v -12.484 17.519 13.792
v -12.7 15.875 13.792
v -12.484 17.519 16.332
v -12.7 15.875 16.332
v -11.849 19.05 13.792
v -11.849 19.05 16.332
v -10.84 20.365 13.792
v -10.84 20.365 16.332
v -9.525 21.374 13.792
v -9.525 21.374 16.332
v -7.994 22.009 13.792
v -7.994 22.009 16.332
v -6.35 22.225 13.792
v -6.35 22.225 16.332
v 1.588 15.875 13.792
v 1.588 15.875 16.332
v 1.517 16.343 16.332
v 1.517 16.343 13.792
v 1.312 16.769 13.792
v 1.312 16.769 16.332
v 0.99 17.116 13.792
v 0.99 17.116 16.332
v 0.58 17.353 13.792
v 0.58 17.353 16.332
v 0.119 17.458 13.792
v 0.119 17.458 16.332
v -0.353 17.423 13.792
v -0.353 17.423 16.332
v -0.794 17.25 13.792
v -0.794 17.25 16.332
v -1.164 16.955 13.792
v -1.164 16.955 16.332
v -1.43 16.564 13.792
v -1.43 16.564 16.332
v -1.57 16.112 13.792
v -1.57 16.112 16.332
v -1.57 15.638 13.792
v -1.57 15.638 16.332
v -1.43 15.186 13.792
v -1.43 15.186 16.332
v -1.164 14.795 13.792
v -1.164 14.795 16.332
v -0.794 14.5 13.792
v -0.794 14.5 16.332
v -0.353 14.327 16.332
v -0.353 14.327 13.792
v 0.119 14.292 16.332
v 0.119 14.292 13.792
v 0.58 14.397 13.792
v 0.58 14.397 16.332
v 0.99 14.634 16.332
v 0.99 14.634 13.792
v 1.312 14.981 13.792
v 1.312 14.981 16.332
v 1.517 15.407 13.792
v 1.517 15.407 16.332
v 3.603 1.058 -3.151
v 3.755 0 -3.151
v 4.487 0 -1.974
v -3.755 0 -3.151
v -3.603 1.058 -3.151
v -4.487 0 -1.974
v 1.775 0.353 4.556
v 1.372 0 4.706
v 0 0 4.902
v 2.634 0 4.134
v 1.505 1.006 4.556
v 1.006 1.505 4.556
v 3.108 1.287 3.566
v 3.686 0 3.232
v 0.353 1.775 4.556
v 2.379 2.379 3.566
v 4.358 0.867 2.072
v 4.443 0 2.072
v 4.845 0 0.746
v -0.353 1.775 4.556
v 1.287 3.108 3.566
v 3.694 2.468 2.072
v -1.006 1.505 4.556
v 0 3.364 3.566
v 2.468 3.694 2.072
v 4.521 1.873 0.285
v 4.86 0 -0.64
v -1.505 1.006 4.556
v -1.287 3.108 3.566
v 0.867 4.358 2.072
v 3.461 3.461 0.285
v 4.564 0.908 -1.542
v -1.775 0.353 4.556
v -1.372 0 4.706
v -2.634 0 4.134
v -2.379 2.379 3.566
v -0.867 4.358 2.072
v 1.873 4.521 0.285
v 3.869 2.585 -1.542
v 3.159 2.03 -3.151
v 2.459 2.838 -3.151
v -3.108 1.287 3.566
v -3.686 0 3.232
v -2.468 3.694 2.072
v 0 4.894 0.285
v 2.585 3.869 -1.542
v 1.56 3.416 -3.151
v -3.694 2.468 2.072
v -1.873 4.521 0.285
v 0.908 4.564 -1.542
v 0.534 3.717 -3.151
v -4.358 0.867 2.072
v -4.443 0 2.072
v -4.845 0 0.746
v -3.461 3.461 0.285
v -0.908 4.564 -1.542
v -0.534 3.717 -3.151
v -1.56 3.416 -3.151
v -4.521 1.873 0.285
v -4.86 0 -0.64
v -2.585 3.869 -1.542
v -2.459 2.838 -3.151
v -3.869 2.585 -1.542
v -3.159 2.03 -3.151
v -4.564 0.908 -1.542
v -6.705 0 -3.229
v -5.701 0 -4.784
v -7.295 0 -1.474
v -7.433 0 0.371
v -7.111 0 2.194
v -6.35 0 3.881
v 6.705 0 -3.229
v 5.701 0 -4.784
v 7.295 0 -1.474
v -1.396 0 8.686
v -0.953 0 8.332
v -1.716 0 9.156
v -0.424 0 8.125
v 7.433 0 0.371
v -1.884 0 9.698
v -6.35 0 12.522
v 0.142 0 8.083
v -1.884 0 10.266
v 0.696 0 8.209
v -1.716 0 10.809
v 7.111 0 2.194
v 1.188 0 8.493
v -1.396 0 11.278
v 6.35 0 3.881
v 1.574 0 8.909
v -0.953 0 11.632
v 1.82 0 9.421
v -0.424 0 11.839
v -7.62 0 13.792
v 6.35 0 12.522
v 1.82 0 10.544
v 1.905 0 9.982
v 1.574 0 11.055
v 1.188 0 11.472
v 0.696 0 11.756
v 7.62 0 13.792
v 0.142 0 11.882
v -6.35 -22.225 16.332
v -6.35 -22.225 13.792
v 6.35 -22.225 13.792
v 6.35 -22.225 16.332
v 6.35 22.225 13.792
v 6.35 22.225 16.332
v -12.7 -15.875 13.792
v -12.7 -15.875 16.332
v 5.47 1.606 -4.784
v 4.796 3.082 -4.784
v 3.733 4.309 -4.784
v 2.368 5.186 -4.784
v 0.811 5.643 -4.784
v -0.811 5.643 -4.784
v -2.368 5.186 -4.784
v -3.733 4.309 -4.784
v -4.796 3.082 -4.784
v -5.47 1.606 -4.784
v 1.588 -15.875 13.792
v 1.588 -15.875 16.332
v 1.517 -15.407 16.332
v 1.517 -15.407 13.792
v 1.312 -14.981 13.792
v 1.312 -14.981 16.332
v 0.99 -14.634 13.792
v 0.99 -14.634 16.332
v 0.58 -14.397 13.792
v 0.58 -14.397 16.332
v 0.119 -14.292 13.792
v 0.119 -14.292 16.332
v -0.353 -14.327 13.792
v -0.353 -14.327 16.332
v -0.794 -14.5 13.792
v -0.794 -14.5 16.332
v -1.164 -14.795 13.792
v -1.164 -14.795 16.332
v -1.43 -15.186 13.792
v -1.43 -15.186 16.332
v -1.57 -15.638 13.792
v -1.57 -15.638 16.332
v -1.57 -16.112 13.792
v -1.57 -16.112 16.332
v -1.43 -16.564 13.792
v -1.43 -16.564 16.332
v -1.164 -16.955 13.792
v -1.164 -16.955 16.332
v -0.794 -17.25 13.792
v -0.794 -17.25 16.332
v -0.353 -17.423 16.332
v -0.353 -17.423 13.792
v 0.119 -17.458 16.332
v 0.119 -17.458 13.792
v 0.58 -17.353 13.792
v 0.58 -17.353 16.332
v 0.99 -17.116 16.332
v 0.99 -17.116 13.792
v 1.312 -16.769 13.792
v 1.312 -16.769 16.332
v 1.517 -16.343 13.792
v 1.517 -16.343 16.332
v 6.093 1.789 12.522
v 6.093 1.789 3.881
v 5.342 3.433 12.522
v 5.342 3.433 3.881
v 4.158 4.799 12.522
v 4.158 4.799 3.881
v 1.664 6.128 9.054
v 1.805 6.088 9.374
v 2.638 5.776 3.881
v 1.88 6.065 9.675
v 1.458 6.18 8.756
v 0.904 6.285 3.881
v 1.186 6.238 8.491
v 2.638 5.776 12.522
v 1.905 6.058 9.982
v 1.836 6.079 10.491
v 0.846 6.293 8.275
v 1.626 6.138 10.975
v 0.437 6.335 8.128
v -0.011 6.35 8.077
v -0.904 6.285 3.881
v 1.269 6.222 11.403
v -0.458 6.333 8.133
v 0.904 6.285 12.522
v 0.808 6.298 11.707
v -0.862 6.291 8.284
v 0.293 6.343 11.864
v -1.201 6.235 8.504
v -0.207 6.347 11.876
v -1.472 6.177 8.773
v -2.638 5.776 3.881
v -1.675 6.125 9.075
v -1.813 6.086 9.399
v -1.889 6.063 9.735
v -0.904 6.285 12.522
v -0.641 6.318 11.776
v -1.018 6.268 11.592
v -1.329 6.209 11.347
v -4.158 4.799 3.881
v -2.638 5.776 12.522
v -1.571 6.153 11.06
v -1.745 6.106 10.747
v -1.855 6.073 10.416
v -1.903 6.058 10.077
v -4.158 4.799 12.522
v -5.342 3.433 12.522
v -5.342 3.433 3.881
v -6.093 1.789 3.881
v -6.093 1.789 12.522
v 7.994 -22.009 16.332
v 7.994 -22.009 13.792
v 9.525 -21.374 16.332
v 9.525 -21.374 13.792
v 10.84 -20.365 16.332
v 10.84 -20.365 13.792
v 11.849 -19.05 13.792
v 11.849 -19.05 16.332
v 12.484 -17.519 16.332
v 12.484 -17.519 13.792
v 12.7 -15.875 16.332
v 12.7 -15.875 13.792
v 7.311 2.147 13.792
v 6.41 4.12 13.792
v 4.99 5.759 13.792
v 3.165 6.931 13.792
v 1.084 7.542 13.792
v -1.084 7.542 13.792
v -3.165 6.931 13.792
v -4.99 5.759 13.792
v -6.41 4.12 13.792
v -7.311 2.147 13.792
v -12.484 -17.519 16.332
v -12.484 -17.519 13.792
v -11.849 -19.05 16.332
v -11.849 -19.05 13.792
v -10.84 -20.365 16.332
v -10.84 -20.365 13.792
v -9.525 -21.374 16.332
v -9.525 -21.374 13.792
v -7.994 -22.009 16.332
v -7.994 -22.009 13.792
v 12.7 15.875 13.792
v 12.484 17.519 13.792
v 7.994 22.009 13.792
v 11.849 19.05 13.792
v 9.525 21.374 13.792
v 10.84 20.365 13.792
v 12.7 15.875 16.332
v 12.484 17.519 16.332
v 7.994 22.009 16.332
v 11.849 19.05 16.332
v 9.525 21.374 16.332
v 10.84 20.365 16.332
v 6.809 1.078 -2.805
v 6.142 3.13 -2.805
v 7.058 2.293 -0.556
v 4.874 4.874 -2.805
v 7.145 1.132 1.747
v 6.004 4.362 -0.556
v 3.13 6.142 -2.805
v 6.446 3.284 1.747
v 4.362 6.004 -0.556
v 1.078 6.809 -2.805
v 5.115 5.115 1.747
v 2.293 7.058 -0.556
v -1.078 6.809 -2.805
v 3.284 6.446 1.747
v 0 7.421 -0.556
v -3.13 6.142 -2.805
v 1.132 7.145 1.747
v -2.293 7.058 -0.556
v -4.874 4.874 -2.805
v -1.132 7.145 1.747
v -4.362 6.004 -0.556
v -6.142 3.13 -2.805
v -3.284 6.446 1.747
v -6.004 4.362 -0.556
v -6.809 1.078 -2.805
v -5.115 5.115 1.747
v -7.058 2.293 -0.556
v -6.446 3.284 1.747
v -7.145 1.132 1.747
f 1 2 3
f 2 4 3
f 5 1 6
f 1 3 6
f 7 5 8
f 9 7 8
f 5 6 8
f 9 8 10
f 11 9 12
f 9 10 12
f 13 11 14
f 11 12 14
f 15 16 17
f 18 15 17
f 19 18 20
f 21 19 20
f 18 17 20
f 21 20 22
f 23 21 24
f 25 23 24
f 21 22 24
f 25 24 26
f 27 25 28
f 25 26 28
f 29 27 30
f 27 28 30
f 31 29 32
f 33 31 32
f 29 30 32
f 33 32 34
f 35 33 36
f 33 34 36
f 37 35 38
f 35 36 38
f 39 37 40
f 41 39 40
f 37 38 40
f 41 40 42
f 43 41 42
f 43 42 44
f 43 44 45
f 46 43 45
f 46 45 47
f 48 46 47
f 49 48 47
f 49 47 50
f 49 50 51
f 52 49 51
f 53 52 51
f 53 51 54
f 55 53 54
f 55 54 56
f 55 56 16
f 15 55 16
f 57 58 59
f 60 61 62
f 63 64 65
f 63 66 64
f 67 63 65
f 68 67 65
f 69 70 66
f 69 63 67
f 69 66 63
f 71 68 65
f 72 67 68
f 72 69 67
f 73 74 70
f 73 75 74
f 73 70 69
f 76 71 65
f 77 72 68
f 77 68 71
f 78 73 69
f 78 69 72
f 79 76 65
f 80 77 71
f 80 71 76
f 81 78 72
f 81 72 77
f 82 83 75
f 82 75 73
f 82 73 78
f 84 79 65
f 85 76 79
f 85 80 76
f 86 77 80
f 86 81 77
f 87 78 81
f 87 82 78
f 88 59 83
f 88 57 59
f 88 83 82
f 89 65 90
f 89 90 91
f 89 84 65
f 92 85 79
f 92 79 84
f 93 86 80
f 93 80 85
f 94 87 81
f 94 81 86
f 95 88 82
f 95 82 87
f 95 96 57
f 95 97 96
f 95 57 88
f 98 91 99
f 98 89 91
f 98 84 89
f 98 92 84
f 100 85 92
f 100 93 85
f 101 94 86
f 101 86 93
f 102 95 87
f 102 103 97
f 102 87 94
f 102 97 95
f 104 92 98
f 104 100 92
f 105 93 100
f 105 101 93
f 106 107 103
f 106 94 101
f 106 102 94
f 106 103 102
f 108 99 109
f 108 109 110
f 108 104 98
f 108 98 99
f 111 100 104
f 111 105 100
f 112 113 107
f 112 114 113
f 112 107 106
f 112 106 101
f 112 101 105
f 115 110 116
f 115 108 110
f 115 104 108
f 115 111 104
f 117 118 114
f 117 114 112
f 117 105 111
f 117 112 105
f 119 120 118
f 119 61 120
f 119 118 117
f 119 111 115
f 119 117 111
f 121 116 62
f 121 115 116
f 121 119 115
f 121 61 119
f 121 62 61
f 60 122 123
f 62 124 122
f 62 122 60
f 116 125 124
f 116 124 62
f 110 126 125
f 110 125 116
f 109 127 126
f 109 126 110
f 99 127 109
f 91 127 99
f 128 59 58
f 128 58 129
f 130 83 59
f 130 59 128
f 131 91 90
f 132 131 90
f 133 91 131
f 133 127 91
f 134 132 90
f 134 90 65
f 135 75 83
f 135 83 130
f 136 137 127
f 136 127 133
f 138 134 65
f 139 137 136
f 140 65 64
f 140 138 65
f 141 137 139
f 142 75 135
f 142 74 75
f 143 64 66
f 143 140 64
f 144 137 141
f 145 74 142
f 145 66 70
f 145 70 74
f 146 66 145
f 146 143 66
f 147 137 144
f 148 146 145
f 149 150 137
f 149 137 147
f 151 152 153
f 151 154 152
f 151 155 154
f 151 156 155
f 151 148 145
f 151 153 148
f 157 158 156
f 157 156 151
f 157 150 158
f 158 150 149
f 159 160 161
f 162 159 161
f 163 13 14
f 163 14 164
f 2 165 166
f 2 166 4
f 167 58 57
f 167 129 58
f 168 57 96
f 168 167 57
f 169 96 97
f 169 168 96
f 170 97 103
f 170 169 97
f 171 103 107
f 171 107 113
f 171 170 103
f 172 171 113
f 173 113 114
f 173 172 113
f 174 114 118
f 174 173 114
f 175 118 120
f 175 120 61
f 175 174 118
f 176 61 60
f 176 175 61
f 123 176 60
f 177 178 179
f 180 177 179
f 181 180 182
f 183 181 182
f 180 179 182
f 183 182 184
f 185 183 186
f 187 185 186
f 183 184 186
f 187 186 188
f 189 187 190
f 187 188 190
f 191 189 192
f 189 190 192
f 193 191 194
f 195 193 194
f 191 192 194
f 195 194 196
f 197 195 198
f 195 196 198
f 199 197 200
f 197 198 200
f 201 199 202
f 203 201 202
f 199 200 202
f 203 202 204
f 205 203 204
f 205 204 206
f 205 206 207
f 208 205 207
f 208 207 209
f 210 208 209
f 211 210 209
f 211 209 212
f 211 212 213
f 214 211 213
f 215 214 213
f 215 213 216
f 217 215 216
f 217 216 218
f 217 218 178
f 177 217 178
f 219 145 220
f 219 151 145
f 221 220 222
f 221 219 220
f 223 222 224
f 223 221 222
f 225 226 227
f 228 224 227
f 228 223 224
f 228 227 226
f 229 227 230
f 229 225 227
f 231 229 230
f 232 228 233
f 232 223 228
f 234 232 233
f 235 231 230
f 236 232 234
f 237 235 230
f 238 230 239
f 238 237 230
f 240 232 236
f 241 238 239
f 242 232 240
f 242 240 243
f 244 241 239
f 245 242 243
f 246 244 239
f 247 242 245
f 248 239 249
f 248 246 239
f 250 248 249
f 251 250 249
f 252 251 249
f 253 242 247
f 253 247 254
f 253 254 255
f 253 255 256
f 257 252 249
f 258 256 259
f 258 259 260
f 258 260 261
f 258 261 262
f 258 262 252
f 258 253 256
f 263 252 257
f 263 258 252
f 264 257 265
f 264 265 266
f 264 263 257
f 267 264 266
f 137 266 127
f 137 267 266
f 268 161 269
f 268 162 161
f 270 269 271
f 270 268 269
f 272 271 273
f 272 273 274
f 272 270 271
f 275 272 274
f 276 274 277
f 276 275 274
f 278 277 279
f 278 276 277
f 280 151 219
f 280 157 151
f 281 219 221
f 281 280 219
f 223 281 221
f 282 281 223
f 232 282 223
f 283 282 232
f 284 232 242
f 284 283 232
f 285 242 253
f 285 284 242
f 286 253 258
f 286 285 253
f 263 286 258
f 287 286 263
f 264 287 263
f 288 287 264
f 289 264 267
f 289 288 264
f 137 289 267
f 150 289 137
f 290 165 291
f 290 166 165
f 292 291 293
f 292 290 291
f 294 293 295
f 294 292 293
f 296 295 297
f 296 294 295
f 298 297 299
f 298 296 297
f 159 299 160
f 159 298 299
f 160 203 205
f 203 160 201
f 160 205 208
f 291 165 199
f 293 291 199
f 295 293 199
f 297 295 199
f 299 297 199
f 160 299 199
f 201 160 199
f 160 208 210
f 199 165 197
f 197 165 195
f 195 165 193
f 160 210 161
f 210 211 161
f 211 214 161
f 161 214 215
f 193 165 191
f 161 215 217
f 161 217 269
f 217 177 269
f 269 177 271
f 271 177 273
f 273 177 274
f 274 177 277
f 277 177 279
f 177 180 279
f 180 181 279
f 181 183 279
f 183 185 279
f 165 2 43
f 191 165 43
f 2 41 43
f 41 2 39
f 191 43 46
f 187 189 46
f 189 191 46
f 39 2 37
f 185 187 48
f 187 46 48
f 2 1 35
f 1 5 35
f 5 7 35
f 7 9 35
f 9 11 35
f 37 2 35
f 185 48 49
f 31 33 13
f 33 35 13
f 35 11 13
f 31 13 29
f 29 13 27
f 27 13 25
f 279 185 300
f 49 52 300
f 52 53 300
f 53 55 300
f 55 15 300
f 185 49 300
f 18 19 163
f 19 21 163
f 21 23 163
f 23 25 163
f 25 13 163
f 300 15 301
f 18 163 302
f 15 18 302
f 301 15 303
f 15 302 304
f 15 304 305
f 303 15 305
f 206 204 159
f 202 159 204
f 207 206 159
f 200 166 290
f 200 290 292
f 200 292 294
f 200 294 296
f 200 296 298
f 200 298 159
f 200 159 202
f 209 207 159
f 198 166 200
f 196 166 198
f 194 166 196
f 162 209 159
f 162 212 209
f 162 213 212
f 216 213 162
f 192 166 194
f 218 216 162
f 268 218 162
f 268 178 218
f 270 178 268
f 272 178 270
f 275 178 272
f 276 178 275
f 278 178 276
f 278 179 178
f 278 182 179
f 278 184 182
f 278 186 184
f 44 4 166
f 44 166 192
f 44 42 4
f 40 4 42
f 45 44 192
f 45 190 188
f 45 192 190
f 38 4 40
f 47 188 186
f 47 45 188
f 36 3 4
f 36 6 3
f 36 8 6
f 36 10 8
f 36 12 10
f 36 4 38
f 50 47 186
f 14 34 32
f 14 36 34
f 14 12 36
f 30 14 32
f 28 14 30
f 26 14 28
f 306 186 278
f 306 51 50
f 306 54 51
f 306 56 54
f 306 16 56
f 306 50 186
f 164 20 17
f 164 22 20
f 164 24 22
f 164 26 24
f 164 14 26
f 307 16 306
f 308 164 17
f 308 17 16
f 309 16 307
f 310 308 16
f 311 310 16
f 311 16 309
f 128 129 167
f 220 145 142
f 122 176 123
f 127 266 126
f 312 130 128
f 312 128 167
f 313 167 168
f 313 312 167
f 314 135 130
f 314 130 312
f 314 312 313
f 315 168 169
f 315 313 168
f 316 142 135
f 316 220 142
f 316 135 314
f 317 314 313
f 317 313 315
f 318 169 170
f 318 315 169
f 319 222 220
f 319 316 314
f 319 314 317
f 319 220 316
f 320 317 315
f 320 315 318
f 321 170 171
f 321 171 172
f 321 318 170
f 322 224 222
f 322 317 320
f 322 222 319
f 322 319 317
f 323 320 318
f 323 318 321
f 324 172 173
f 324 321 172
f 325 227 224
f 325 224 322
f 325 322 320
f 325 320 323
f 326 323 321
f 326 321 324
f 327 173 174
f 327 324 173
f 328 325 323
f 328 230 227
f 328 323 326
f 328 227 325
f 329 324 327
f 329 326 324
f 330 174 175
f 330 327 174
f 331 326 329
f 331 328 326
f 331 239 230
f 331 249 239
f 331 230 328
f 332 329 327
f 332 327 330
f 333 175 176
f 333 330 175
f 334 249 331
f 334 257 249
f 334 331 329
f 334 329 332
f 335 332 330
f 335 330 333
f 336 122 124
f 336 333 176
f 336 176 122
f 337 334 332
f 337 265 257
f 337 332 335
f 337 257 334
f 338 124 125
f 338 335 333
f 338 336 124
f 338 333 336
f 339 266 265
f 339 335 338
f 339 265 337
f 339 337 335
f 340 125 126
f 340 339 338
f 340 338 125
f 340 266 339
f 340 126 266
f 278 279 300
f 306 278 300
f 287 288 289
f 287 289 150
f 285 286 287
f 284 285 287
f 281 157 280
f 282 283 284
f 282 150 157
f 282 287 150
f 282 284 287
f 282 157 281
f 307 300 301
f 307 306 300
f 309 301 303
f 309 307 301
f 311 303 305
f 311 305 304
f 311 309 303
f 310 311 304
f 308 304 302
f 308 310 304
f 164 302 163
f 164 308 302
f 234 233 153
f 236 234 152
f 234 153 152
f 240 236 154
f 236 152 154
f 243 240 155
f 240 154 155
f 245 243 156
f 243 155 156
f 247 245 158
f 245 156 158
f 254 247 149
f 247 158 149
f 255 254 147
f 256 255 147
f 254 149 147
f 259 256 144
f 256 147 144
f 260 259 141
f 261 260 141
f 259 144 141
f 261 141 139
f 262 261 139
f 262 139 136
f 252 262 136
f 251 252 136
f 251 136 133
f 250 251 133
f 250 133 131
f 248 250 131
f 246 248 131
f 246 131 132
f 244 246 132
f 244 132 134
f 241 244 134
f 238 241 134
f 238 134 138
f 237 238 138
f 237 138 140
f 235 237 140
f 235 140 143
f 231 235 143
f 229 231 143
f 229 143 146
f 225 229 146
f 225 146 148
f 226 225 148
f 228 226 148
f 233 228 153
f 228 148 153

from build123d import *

# Parameters (mm, degrees)
F1_ANGLE = 180
F3_R     = 1.905
F4_DEPTH = 7.621
F5_W     = 25.4
F5_H     = 44.45
F6_DEPTH = 2.54
F7_R     = 6.35
F8_R     = 1.5875
F9_DEPTH = 21.1169539488


with BuildPart() as f1:
    # F0 (on Front) → F1 (revolve)
    with BuildSketch(Plane.XZ):
        with BuildLine():
            ThreePointArc((0, 4.9022), (4.4429020336, 2.0717592427), (3.7553030691, -3.1510734202))
            Line((3.7553030691, -3.1510734202), (5.7010559546, -4.7837539488))
            ThreePointArc((5.7010559546, -4.7837539488), (7.4214159865, -0.5558107544), (6.35, 3.8812164124))
            Line((6.35, 3.8812164124), (6.35, 7.3025))
            Line((6.35, 7.3025), (6.35, 12.5222))
            Line((6.35, 12.5222), (7.62, 13.7922))
            Line((7.62, 13.7922), (6.35, 13.7922))
            Line((6.35, 13.7922), (0, 13.7922))
            Line((0, 13.7922), (0, 7.4422))
            Line((0, 7.4422), (0, 4.9022))
        make_face()
    revolve(axis=Axis((0, 0, 10.6172), (0, 0, 1)), revolution_arc=F1_ANGLE)

    # F3 (on face) → F4 (cut, through all)
    with BuildSketch(Plane.XZ):
        with Locations((0, 9.9822)):
            Circle(F3_R)
    extrude(amount=-F4_DEPTH, mode=Mode.SUBTRACT)


with BuildPart() as f6:
    # F5 (on face) → F6 (new body)
    with BuildSketch(Plane.XY.offset(13.7922)):
        Rectangle(F5_W, F5_H)
        with BuildLine():
            ThreePointArc((-7.62, 0), (0, 7.62), (7.62, 0))
            Line((7.62, 0), (-7.62, 0))
        make_face(mode=Mode.SUBTRACT)
        with BuildLine():
            Line((-7.62, 0), (7.62, 0))
            ThreePointArc((7.62, 0), (0, 7.62), (-7.62, 0))
        make_face()
    extrude(amount=F6_DEPTH)

    # F7
    f7_edges = [f6.edges().sort_by_distance(p)[0] for p in [
        (12.7, 22.225, 15.0622),
        (-12.7, 22.225, 15.0622),
        (-12.7, -22.225, 15.0622),
        (12.7, -22.225, 15.0622),
    ]]
    fillet(f7_edges, radius=F7_R)

    # F8 (on face) → F9 (cut, through all)
    with BuildSketch(Plane.XY.offset(16.3322)):
        with Locations((0, 15.875)):
            Circle(F8_R)
        with Locations((0, -15.875)):
            Circle(F8_R)
    extrude(amount=-F9_DEPTH, mode=Mode.SUBTRACT)


solid = Compound([f1.part, f6.part])
